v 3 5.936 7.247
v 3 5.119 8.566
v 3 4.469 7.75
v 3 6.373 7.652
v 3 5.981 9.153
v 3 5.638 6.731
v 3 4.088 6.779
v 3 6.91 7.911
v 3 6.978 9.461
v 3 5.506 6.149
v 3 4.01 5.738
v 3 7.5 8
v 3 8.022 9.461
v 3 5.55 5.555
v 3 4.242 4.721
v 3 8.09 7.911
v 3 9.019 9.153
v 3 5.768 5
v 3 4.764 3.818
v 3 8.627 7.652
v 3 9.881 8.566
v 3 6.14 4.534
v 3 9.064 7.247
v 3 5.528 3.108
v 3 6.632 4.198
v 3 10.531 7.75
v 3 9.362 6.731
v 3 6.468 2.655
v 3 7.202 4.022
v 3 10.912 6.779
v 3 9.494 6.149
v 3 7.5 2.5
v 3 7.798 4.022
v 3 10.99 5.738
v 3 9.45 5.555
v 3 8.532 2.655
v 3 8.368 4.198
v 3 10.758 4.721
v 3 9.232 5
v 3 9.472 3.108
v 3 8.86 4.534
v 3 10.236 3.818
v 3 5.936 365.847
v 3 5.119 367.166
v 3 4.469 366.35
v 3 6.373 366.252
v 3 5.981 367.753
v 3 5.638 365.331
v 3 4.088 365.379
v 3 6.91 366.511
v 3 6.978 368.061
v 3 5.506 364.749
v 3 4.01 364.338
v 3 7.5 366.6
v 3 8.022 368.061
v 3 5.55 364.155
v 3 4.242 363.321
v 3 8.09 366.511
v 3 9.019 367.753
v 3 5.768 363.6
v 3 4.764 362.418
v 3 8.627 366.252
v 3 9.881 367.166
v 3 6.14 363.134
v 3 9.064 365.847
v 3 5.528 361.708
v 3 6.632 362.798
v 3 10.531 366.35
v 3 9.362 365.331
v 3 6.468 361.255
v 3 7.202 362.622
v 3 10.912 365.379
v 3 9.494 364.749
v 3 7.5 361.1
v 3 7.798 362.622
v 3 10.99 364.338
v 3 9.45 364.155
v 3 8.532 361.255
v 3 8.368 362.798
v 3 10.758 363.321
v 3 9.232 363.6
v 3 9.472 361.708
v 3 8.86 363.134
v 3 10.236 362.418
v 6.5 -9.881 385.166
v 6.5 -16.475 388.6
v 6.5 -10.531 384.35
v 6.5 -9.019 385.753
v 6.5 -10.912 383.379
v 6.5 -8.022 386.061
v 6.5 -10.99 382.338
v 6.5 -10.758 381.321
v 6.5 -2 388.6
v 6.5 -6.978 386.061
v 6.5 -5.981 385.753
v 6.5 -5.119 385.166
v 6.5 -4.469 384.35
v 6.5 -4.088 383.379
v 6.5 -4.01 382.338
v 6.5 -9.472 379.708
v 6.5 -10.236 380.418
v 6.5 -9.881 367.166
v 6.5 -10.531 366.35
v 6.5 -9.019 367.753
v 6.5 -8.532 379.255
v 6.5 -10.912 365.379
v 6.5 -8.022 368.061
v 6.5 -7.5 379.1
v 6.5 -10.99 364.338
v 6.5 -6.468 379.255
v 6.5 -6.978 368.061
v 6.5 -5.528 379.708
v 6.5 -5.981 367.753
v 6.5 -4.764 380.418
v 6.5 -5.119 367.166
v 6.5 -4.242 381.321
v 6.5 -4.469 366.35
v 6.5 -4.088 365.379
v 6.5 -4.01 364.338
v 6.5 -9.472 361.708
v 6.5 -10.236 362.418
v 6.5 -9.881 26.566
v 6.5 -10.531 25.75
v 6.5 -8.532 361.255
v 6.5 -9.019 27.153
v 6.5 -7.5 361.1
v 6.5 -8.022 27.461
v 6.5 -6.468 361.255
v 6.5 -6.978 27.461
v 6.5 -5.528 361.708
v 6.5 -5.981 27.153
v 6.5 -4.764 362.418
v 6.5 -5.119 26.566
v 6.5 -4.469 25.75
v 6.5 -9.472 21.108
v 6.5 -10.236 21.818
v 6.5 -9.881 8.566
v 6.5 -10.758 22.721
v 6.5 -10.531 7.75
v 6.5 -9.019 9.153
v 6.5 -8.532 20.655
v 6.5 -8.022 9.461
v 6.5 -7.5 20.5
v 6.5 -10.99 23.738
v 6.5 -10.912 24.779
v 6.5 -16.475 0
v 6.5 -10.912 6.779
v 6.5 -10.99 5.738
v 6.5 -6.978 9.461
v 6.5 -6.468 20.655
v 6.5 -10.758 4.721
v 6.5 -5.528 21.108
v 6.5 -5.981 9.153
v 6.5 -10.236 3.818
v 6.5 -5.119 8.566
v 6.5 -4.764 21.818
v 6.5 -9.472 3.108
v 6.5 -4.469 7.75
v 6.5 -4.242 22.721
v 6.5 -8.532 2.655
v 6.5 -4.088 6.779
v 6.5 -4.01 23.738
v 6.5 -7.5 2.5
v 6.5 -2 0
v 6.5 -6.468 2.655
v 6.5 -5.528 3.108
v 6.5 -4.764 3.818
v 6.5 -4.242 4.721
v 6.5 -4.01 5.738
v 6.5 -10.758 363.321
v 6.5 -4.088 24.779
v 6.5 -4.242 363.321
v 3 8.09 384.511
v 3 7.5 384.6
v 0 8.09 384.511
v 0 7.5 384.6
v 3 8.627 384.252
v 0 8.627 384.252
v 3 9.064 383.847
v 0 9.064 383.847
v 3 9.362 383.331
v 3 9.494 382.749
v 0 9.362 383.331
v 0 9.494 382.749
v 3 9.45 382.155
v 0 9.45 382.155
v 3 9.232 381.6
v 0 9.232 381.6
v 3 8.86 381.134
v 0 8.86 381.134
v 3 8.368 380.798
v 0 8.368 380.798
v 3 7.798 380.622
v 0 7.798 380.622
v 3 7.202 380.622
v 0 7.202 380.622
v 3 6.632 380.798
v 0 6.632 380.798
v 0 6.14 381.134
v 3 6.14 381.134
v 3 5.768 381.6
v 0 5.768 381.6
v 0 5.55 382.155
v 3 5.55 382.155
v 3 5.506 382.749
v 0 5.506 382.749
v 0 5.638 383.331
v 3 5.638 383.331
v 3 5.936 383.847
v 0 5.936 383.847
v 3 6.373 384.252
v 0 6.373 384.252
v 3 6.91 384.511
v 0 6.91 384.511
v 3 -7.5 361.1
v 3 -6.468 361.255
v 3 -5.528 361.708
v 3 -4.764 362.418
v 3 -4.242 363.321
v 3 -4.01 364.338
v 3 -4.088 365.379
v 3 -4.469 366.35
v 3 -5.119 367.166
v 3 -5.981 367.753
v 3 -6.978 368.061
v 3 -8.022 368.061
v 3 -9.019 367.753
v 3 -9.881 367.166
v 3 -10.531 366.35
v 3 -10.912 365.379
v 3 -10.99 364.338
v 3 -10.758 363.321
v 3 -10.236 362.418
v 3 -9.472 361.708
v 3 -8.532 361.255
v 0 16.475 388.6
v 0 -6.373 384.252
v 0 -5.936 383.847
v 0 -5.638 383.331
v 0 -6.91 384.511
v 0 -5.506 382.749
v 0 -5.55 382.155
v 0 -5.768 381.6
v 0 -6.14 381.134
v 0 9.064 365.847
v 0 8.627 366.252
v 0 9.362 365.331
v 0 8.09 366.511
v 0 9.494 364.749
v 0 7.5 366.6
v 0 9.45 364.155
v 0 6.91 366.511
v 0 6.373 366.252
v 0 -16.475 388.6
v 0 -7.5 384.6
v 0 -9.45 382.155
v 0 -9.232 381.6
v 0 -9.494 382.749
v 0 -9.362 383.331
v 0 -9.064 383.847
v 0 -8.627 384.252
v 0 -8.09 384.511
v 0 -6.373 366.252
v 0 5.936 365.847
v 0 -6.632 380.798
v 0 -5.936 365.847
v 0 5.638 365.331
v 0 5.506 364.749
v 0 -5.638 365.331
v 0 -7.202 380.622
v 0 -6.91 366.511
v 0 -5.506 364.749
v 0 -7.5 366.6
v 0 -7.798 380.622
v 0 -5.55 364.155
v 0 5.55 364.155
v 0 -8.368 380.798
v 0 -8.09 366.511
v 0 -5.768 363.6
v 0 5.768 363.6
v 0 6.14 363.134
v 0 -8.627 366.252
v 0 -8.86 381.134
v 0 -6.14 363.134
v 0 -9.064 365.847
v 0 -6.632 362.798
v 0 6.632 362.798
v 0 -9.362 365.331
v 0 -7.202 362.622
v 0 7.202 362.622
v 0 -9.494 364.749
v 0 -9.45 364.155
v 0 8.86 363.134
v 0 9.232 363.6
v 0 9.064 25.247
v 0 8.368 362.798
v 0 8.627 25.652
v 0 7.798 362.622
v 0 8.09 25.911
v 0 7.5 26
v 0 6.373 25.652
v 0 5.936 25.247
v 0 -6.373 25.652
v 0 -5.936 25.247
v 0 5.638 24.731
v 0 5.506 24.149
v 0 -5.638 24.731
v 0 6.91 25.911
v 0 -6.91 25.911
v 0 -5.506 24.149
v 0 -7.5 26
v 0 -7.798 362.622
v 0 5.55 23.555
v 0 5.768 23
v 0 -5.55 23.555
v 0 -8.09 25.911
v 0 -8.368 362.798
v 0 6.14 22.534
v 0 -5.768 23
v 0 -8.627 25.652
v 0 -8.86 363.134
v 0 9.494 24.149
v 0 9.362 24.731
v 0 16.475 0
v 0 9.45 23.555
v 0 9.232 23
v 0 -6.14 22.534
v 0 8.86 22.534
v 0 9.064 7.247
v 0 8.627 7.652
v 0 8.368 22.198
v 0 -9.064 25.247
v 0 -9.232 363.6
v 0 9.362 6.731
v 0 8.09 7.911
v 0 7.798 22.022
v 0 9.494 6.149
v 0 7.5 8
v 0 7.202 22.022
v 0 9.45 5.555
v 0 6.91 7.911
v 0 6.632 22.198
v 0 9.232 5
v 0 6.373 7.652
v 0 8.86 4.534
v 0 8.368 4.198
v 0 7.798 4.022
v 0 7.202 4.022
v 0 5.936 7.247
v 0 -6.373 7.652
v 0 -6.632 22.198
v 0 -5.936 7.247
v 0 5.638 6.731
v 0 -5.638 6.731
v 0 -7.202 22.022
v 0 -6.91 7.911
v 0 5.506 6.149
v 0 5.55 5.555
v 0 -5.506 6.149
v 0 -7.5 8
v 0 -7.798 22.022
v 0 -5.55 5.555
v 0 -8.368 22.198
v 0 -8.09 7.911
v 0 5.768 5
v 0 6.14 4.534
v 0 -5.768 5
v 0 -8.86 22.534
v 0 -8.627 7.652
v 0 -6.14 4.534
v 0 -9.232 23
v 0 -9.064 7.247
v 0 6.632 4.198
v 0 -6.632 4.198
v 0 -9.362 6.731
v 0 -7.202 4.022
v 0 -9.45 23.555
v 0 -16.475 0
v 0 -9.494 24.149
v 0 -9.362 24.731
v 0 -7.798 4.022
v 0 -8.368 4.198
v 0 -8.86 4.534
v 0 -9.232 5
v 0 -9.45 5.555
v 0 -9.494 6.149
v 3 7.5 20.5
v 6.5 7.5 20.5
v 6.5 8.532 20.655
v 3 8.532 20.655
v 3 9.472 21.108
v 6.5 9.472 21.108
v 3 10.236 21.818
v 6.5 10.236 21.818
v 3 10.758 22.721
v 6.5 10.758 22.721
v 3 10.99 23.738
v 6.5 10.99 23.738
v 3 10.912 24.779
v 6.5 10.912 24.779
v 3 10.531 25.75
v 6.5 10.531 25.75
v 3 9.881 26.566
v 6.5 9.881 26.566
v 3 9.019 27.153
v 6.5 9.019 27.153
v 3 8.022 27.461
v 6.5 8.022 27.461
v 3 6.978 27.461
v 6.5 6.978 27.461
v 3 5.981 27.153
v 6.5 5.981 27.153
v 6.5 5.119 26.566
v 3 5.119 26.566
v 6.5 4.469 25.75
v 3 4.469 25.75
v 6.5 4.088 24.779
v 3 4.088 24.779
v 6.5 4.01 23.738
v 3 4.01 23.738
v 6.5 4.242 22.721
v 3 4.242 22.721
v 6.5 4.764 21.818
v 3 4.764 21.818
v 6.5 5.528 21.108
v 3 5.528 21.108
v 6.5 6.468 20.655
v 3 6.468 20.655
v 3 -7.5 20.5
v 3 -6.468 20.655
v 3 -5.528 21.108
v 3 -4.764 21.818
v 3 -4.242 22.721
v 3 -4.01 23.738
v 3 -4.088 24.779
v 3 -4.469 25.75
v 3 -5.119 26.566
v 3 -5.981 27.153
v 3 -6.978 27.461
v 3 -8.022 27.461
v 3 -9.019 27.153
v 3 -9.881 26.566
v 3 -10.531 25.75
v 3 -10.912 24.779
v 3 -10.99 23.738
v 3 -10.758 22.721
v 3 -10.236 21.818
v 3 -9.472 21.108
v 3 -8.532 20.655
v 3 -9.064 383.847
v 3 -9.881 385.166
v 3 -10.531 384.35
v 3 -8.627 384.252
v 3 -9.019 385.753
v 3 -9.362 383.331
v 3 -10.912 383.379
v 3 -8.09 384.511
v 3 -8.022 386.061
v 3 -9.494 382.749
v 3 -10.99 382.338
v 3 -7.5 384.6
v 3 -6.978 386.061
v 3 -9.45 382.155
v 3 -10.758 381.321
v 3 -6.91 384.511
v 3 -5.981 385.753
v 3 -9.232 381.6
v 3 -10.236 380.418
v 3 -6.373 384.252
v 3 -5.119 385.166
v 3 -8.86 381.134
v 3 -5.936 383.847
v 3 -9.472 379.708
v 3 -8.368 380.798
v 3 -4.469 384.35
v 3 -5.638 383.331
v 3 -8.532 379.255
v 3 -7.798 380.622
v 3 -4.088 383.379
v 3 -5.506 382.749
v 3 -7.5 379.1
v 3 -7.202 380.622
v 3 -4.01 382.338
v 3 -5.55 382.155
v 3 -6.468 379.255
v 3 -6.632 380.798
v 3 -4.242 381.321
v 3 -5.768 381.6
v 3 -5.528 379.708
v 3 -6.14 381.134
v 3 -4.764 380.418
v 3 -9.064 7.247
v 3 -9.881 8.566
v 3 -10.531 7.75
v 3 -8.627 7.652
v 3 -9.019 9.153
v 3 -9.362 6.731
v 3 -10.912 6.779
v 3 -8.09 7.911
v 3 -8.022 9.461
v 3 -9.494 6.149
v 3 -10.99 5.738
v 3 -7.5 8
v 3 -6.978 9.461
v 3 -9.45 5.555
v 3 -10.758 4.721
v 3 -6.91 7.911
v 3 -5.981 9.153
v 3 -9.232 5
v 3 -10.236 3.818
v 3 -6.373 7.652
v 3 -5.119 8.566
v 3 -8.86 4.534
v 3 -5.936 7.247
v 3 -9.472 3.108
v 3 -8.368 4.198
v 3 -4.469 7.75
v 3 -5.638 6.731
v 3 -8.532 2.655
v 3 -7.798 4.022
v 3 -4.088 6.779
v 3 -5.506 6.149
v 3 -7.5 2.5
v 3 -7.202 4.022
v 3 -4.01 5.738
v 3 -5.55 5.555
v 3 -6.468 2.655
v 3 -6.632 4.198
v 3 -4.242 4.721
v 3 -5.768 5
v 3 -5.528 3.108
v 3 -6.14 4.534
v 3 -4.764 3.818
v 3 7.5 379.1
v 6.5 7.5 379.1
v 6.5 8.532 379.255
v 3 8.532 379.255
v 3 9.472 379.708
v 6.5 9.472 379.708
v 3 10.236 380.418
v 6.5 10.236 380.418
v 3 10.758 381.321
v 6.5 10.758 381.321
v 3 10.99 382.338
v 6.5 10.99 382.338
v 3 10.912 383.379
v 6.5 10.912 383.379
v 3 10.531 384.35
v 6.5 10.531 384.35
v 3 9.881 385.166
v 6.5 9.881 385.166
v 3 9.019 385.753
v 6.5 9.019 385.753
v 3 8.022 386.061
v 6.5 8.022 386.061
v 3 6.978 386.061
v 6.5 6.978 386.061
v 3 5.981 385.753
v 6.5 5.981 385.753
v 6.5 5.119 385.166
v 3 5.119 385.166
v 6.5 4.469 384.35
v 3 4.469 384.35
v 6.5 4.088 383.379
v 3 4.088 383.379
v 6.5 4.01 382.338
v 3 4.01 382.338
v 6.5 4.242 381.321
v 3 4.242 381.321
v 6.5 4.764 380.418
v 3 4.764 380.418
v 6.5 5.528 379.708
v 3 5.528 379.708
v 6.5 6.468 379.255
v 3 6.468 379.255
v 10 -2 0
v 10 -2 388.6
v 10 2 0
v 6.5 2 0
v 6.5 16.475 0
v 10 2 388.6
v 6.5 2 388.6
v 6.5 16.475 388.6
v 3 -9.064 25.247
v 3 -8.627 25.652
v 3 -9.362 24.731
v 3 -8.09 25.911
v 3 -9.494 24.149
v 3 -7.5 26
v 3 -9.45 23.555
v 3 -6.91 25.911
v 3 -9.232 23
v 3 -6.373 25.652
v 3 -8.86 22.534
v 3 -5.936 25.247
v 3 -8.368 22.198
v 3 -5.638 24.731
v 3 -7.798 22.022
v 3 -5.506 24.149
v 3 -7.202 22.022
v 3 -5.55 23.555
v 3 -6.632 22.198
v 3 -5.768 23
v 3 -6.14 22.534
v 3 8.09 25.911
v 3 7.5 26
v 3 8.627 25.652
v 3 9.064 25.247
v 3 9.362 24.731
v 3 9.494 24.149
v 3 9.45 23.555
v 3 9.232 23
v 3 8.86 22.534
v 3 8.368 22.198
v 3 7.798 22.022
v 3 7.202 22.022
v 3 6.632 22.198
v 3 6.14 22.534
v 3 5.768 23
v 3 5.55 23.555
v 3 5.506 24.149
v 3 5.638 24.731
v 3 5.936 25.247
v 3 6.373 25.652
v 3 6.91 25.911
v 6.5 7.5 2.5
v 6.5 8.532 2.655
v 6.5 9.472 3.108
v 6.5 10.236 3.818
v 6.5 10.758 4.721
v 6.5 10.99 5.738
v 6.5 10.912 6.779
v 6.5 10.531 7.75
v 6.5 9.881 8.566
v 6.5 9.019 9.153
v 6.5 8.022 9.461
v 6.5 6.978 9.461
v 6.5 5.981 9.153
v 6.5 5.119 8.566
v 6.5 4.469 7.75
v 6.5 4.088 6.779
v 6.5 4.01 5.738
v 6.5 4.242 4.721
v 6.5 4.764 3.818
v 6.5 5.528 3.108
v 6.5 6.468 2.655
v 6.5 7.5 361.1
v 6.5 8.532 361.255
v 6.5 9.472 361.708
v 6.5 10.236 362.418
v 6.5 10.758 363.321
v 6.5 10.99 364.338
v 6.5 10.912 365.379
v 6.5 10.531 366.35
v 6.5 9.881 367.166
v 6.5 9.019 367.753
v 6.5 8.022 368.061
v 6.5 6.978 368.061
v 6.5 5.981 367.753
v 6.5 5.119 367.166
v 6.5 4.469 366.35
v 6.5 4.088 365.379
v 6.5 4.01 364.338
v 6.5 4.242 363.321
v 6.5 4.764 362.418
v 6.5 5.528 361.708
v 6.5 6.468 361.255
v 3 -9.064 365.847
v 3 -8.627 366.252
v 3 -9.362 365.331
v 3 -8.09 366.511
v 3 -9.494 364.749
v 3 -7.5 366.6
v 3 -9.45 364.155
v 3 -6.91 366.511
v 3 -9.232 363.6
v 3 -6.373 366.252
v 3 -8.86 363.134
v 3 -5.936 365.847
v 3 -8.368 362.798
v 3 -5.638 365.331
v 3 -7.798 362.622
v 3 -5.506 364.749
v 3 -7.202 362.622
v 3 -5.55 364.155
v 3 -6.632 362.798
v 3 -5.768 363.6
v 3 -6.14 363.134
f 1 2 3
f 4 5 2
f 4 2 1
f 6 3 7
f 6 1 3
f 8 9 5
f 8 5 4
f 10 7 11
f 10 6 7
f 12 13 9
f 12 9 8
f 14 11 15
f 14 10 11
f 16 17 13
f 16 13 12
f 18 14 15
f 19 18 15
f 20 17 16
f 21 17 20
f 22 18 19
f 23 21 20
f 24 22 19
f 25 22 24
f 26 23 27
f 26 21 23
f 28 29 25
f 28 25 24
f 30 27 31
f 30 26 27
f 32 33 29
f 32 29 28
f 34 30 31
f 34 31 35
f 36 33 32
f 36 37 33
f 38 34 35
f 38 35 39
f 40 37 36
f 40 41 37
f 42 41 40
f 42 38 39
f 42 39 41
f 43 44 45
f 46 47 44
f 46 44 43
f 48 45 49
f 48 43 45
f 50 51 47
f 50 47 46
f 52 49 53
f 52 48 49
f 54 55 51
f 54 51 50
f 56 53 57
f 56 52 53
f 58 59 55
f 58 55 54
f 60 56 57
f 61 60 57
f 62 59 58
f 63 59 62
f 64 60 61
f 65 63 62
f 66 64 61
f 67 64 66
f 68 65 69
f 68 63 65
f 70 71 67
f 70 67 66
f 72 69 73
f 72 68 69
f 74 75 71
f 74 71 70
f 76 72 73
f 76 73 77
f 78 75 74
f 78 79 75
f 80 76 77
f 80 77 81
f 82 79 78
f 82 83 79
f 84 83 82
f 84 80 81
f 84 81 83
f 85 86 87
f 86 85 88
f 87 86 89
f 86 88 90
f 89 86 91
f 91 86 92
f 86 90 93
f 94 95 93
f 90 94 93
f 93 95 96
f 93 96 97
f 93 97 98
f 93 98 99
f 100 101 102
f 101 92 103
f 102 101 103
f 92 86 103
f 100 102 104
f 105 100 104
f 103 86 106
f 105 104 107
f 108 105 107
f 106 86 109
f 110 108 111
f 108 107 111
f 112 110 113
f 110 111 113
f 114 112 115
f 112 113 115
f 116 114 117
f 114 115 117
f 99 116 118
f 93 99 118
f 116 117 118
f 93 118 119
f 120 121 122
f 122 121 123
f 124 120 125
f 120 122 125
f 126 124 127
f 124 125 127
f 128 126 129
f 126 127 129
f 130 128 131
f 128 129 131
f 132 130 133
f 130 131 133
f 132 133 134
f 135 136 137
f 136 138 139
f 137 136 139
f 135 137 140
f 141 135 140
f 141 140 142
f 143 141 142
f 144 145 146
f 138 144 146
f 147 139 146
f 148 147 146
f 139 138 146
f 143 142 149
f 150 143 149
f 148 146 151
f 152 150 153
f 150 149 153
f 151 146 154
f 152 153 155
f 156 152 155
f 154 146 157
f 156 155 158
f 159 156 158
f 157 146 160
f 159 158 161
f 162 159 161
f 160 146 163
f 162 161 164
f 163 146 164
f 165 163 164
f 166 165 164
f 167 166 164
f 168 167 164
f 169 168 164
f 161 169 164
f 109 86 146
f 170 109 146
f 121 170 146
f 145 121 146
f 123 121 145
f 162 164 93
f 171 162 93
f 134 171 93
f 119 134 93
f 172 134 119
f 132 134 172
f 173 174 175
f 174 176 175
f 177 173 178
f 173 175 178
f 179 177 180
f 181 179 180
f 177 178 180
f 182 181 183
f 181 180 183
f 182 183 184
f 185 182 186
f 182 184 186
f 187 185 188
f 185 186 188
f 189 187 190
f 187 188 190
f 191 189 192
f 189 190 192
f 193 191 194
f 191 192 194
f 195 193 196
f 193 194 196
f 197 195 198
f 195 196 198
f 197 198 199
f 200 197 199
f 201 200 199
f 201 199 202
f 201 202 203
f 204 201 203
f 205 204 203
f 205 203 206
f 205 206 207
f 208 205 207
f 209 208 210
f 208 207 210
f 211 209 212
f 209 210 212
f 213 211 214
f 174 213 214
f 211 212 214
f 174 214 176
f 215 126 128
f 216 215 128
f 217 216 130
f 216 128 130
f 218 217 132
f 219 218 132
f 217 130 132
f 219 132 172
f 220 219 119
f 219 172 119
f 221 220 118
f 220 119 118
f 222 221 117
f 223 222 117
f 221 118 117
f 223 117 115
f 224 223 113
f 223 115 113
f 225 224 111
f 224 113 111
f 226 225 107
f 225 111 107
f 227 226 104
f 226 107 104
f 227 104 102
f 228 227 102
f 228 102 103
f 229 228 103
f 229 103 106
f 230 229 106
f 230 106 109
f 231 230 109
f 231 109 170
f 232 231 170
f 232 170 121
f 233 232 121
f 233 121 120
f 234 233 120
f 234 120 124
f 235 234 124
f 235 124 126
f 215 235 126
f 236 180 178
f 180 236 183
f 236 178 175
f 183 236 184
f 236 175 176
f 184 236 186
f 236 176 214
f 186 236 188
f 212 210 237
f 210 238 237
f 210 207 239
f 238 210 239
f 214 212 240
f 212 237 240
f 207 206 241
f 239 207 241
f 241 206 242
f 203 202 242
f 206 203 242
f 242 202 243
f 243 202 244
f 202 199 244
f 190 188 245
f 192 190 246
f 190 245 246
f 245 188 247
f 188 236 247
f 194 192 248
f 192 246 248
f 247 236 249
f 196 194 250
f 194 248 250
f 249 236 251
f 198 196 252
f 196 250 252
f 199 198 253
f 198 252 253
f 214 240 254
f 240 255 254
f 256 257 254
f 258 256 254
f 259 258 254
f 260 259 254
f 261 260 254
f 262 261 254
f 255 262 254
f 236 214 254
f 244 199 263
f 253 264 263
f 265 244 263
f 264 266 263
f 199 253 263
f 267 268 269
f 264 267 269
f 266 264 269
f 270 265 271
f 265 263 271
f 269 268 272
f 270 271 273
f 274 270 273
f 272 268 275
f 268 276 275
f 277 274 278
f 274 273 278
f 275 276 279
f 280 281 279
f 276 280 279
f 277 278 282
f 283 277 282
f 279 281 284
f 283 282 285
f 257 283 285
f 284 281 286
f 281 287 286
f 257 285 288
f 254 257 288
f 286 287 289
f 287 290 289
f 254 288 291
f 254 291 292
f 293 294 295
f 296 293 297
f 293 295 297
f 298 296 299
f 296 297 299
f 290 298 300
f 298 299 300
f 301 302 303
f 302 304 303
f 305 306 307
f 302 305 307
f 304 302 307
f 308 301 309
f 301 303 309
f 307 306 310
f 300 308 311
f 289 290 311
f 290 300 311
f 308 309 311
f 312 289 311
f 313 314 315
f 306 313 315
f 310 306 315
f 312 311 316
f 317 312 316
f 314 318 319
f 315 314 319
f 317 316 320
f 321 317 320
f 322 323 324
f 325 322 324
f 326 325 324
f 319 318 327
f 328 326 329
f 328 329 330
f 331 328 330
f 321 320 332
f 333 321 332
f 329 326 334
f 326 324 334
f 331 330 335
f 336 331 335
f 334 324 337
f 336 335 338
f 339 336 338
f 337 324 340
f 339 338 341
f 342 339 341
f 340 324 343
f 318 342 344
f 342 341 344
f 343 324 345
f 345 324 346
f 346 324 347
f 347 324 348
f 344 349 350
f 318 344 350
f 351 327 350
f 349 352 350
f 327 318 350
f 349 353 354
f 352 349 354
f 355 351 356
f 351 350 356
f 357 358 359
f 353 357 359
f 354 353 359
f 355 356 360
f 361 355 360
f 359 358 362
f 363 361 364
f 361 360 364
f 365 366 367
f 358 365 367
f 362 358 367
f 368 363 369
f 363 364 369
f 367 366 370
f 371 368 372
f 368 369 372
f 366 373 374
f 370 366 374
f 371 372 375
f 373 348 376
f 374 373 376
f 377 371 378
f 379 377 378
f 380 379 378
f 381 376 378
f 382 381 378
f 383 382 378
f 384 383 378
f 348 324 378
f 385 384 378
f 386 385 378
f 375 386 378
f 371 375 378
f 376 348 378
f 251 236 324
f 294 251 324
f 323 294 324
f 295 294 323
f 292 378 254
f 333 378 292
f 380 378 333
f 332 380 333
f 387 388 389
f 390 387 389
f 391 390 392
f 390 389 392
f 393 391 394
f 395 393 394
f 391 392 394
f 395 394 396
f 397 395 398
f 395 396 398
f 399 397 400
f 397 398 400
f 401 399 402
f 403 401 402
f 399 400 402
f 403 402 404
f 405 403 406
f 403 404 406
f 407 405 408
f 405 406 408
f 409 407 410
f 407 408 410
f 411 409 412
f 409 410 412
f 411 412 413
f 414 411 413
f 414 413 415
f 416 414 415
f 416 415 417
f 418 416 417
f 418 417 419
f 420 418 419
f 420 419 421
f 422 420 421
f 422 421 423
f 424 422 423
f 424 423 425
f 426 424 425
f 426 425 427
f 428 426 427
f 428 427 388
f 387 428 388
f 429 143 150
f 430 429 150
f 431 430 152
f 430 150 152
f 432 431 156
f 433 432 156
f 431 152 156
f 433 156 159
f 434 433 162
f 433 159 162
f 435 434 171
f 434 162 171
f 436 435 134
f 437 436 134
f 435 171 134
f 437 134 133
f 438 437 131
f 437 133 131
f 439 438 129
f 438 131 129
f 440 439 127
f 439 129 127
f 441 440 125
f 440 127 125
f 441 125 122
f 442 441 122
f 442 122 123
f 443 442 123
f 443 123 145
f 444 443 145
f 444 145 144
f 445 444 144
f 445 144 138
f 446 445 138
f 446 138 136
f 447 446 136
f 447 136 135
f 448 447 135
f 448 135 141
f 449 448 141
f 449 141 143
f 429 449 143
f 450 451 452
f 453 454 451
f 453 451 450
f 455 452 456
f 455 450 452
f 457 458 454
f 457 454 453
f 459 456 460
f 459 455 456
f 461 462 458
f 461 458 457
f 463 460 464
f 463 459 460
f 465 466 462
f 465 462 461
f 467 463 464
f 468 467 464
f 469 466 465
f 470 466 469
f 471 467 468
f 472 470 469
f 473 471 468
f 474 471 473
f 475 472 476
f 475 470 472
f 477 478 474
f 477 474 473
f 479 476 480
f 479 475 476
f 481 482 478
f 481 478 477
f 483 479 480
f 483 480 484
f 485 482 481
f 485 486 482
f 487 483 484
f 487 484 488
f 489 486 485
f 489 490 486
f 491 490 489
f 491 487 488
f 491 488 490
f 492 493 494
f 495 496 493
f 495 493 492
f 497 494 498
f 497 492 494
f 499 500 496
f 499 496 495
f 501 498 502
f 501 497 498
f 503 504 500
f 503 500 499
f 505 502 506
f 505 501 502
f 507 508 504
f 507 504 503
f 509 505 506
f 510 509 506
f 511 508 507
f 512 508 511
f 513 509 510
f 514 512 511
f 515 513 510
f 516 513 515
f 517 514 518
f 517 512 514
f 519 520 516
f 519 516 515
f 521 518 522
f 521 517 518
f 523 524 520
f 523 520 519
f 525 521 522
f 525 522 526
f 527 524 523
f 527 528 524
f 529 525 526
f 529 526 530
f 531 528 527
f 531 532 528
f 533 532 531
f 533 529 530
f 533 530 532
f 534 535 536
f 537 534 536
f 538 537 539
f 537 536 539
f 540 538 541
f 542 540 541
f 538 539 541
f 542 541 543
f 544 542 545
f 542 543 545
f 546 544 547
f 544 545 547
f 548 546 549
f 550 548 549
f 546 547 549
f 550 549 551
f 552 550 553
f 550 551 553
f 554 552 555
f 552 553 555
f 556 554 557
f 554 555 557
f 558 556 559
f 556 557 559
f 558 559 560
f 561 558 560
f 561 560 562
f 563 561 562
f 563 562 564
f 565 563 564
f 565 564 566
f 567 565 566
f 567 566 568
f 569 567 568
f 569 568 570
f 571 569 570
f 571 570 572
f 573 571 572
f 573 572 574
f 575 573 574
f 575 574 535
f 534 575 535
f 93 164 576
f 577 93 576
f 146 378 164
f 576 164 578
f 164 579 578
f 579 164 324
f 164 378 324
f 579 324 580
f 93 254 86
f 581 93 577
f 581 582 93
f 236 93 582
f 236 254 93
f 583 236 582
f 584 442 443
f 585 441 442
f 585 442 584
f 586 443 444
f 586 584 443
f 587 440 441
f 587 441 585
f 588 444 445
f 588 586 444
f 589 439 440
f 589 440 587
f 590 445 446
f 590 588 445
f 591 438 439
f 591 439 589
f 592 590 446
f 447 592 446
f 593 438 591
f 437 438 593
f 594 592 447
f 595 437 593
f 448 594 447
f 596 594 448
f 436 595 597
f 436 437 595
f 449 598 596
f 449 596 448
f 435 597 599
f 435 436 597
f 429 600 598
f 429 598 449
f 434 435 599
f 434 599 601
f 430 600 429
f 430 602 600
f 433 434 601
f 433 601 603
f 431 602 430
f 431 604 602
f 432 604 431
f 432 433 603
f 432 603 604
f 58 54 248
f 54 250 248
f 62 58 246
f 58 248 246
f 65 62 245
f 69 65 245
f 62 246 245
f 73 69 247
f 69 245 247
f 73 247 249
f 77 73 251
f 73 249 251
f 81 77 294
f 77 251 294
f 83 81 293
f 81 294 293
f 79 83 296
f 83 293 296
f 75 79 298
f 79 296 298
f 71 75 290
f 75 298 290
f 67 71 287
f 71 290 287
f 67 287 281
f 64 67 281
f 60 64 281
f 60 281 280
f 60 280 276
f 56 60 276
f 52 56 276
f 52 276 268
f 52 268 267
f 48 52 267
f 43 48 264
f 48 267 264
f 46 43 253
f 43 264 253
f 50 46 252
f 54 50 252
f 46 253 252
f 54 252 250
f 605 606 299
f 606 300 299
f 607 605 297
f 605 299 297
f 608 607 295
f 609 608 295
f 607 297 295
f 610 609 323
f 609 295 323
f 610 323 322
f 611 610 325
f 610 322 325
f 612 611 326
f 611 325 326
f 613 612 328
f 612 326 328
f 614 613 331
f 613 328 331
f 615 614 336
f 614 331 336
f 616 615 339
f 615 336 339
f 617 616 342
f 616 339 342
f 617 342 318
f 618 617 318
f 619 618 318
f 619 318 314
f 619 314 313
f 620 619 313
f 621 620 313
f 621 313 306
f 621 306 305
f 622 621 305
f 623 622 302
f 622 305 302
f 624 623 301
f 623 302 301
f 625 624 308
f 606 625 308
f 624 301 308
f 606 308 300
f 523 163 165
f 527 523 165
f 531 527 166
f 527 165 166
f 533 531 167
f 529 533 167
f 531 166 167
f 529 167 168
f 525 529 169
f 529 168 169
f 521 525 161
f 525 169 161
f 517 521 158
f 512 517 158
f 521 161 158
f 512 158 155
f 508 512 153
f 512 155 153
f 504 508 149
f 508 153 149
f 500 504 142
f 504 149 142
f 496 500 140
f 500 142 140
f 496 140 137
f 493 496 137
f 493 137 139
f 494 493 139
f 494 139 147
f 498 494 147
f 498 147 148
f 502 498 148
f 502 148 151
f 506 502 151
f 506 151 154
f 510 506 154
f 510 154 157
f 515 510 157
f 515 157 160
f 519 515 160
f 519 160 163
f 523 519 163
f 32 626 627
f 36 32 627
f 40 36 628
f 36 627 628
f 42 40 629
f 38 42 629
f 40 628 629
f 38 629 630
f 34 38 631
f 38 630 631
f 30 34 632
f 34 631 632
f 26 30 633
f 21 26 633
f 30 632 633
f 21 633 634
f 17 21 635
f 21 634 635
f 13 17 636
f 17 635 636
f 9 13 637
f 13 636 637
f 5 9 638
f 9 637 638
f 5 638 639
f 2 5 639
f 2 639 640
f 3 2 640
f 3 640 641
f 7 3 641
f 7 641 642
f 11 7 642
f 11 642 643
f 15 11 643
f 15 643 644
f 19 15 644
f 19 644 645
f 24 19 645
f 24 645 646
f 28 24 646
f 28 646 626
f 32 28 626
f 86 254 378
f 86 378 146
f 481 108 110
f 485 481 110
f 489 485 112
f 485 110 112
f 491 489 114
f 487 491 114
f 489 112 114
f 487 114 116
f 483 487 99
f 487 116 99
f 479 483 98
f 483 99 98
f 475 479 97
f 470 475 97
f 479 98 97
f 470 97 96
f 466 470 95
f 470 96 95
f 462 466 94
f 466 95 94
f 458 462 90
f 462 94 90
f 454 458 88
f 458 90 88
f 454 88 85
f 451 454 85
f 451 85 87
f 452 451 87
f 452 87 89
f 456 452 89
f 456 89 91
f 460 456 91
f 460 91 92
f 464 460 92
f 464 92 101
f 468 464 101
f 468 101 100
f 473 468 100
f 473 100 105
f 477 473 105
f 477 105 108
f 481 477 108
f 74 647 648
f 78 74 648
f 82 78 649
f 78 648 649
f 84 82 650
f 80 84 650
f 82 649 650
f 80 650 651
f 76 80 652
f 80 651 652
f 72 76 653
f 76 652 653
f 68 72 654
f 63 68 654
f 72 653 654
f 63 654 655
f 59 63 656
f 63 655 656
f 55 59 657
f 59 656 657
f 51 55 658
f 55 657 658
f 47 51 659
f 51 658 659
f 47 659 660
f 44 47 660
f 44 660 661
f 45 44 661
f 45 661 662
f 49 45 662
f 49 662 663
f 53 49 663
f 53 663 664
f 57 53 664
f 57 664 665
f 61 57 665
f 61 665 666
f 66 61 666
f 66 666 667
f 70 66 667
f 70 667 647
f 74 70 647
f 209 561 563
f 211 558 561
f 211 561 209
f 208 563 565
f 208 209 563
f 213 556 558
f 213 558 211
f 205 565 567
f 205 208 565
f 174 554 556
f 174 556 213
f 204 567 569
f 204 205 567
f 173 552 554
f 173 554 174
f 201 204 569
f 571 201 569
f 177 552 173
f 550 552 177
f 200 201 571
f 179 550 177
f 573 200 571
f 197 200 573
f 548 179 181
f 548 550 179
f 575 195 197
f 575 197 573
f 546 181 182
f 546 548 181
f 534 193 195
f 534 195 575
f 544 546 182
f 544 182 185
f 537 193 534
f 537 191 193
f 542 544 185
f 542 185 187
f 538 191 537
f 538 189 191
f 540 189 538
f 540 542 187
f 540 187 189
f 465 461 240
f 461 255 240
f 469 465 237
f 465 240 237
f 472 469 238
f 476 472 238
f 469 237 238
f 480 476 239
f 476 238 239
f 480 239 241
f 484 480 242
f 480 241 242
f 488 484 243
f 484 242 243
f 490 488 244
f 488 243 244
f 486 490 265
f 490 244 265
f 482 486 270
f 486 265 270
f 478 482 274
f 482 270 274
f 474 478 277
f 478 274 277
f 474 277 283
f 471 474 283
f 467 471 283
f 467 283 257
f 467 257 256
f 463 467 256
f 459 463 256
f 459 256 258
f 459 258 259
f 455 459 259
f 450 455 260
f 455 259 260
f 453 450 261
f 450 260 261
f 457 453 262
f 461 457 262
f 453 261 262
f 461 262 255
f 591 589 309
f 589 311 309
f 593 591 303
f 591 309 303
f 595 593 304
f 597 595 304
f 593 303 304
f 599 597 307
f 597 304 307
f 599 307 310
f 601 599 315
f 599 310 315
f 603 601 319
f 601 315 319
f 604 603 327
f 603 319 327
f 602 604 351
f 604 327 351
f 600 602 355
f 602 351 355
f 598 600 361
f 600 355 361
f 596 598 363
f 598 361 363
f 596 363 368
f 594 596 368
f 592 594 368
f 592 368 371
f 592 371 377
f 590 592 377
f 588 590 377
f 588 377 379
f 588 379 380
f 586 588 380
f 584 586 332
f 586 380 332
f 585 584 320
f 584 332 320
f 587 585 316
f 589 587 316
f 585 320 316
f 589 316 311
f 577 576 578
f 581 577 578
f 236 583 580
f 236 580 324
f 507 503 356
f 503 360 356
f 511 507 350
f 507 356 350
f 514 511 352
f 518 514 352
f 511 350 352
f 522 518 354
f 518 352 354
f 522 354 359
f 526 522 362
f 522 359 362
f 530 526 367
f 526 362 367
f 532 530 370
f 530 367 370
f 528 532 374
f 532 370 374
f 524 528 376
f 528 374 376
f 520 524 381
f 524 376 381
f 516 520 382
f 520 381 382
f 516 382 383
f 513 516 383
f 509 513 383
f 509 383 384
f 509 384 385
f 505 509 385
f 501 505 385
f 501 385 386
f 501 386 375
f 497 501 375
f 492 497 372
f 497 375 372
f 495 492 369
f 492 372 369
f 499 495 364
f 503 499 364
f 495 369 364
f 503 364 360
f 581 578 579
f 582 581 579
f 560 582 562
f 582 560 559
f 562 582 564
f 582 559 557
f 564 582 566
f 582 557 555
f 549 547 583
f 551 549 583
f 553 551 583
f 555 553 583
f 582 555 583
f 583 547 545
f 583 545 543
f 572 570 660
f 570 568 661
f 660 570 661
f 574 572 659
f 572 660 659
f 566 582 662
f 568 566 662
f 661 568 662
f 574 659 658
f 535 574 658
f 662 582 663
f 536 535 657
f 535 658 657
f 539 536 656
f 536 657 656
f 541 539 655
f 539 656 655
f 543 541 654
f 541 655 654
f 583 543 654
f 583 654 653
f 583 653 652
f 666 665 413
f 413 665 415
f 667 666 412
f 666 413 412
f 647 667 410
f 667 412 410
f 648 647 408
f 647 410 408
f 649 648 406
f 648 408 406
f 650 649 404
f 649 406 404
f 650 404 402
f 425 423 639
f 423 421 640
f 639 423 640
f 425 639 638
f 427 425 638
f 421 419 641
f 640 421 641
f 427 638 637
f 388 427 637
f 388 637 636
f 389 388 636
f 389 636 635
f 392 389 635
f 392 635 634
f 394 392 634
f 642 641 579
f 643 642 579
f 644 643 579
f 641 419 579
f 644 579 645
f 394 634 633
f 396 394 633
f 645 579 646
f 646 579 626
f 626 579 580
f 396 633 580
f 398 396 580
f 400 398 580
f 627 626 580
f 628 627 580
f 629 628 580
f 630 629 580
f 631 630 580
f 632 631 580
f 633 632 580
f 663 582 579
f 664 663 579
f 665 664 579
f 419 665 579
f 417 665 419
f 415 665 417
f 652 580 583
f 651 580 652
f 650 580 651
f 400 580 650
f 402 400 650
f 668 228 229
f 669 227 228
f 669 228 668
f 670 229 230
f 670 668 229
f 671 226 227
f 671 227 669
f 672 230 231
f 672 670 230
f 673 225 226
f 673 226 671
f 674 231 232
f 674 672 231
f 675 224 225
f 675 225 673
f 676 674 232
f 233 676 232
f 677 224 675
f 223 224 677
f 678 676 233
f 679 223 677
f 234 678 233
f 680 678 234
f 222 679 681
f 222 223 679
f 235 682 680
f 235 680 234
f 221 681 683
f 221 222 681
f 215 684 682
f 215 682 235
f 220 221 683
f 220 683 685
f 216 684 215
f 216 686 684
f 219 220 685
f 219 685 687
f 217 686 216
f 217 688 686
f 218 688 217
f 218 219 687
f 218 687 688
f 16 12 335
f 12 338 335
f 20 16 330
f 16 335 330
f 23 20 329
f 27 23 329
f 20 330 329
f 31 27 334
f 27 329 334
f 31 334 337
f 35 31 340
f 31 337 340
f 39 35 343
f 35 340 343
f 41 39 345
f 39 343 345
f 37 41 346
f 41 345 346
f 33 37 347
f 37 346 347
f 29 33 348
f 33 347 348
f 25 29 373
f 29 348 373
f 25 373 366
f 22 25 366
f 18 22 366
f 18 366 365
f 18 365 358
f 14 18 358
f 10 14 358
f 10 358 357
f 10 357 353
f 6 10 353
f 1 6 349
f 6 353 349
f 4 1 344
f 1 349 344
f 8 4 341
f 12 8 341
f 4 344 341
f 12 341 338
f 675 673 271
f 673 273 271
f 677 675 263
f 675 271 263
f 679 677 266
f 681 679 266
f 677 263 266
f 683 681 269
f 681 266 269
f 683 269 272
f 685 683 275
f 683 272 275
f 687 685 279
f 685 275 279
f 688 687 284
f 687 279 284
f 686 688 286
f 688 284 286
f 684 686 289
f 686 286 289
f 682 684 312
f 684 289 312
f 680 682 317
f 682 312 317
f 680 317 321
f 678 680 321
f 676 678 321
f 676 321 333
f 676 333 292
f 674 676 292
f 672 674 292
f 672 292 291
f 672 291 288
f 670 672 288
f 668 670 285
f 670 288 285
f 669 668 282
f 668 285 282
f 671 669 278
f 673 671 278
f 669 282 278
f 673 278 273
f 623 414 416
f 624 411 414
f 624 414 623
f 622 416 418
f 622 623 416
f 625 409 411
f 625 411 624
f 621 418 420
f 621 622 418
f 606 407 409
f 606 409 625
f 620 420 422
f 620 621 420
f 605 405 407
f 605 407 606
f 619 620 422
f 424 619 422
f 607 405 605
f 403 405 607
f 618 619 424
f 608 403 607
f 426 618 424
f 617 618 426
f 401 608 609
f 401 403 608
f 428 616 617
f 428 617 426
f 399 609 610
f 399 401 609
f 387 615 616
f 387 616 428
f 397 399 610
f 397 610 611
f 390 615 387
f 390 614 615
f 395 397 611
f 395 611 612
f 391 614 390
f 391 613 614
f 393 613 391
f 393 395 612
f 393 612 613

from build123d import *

# Parameters (mm, degrees)
EXTRUDE_1_DEPTH           = 388.6
HOLE_WIZARD_1_D           = 4
HOLE_WIZARD_1_CBORE_D     = 7
HOLE_WIZARD_1_CBORE_DEPTH = 3.5


with BuildPart() as part:
    # 草图1 → 凸台-拉伸1 (new body)
    with BuildSketch(Plane.XY):
        Polygon((0, 16.475), (0, -16.475), (6.5, -16.475), (6.5, -2), (10, -2), (10, 2), (6.5, 2), (6.5, 16.475), align=None)
    extrude(amount=EXTRUDE_1_DEPTH)

    # 打孔尺寸(%根据)内六角圆柱头螺钉的类型1 (through all)
    with Locations(Plane(origin=(6.5, 0, 0), x_dir=(0, 0, -1), z_dir=(1, 0, 0))):
        with Locations((-382.6, -7.5), (-364.6, -7.5), (-364.6, 7.5), (-382.6, 7.5), (-24, 7.5), (-24, -7.5), (-6, -7.5), (-6, 7.5)):
            CounterBoreHole(HOLE_WIZARD_1_D / 2, HOLE_WIZARD_1_CBORE_D / 2, HOLE_WIZARD_1_CBORE_DEPTH)


solid = part.part
